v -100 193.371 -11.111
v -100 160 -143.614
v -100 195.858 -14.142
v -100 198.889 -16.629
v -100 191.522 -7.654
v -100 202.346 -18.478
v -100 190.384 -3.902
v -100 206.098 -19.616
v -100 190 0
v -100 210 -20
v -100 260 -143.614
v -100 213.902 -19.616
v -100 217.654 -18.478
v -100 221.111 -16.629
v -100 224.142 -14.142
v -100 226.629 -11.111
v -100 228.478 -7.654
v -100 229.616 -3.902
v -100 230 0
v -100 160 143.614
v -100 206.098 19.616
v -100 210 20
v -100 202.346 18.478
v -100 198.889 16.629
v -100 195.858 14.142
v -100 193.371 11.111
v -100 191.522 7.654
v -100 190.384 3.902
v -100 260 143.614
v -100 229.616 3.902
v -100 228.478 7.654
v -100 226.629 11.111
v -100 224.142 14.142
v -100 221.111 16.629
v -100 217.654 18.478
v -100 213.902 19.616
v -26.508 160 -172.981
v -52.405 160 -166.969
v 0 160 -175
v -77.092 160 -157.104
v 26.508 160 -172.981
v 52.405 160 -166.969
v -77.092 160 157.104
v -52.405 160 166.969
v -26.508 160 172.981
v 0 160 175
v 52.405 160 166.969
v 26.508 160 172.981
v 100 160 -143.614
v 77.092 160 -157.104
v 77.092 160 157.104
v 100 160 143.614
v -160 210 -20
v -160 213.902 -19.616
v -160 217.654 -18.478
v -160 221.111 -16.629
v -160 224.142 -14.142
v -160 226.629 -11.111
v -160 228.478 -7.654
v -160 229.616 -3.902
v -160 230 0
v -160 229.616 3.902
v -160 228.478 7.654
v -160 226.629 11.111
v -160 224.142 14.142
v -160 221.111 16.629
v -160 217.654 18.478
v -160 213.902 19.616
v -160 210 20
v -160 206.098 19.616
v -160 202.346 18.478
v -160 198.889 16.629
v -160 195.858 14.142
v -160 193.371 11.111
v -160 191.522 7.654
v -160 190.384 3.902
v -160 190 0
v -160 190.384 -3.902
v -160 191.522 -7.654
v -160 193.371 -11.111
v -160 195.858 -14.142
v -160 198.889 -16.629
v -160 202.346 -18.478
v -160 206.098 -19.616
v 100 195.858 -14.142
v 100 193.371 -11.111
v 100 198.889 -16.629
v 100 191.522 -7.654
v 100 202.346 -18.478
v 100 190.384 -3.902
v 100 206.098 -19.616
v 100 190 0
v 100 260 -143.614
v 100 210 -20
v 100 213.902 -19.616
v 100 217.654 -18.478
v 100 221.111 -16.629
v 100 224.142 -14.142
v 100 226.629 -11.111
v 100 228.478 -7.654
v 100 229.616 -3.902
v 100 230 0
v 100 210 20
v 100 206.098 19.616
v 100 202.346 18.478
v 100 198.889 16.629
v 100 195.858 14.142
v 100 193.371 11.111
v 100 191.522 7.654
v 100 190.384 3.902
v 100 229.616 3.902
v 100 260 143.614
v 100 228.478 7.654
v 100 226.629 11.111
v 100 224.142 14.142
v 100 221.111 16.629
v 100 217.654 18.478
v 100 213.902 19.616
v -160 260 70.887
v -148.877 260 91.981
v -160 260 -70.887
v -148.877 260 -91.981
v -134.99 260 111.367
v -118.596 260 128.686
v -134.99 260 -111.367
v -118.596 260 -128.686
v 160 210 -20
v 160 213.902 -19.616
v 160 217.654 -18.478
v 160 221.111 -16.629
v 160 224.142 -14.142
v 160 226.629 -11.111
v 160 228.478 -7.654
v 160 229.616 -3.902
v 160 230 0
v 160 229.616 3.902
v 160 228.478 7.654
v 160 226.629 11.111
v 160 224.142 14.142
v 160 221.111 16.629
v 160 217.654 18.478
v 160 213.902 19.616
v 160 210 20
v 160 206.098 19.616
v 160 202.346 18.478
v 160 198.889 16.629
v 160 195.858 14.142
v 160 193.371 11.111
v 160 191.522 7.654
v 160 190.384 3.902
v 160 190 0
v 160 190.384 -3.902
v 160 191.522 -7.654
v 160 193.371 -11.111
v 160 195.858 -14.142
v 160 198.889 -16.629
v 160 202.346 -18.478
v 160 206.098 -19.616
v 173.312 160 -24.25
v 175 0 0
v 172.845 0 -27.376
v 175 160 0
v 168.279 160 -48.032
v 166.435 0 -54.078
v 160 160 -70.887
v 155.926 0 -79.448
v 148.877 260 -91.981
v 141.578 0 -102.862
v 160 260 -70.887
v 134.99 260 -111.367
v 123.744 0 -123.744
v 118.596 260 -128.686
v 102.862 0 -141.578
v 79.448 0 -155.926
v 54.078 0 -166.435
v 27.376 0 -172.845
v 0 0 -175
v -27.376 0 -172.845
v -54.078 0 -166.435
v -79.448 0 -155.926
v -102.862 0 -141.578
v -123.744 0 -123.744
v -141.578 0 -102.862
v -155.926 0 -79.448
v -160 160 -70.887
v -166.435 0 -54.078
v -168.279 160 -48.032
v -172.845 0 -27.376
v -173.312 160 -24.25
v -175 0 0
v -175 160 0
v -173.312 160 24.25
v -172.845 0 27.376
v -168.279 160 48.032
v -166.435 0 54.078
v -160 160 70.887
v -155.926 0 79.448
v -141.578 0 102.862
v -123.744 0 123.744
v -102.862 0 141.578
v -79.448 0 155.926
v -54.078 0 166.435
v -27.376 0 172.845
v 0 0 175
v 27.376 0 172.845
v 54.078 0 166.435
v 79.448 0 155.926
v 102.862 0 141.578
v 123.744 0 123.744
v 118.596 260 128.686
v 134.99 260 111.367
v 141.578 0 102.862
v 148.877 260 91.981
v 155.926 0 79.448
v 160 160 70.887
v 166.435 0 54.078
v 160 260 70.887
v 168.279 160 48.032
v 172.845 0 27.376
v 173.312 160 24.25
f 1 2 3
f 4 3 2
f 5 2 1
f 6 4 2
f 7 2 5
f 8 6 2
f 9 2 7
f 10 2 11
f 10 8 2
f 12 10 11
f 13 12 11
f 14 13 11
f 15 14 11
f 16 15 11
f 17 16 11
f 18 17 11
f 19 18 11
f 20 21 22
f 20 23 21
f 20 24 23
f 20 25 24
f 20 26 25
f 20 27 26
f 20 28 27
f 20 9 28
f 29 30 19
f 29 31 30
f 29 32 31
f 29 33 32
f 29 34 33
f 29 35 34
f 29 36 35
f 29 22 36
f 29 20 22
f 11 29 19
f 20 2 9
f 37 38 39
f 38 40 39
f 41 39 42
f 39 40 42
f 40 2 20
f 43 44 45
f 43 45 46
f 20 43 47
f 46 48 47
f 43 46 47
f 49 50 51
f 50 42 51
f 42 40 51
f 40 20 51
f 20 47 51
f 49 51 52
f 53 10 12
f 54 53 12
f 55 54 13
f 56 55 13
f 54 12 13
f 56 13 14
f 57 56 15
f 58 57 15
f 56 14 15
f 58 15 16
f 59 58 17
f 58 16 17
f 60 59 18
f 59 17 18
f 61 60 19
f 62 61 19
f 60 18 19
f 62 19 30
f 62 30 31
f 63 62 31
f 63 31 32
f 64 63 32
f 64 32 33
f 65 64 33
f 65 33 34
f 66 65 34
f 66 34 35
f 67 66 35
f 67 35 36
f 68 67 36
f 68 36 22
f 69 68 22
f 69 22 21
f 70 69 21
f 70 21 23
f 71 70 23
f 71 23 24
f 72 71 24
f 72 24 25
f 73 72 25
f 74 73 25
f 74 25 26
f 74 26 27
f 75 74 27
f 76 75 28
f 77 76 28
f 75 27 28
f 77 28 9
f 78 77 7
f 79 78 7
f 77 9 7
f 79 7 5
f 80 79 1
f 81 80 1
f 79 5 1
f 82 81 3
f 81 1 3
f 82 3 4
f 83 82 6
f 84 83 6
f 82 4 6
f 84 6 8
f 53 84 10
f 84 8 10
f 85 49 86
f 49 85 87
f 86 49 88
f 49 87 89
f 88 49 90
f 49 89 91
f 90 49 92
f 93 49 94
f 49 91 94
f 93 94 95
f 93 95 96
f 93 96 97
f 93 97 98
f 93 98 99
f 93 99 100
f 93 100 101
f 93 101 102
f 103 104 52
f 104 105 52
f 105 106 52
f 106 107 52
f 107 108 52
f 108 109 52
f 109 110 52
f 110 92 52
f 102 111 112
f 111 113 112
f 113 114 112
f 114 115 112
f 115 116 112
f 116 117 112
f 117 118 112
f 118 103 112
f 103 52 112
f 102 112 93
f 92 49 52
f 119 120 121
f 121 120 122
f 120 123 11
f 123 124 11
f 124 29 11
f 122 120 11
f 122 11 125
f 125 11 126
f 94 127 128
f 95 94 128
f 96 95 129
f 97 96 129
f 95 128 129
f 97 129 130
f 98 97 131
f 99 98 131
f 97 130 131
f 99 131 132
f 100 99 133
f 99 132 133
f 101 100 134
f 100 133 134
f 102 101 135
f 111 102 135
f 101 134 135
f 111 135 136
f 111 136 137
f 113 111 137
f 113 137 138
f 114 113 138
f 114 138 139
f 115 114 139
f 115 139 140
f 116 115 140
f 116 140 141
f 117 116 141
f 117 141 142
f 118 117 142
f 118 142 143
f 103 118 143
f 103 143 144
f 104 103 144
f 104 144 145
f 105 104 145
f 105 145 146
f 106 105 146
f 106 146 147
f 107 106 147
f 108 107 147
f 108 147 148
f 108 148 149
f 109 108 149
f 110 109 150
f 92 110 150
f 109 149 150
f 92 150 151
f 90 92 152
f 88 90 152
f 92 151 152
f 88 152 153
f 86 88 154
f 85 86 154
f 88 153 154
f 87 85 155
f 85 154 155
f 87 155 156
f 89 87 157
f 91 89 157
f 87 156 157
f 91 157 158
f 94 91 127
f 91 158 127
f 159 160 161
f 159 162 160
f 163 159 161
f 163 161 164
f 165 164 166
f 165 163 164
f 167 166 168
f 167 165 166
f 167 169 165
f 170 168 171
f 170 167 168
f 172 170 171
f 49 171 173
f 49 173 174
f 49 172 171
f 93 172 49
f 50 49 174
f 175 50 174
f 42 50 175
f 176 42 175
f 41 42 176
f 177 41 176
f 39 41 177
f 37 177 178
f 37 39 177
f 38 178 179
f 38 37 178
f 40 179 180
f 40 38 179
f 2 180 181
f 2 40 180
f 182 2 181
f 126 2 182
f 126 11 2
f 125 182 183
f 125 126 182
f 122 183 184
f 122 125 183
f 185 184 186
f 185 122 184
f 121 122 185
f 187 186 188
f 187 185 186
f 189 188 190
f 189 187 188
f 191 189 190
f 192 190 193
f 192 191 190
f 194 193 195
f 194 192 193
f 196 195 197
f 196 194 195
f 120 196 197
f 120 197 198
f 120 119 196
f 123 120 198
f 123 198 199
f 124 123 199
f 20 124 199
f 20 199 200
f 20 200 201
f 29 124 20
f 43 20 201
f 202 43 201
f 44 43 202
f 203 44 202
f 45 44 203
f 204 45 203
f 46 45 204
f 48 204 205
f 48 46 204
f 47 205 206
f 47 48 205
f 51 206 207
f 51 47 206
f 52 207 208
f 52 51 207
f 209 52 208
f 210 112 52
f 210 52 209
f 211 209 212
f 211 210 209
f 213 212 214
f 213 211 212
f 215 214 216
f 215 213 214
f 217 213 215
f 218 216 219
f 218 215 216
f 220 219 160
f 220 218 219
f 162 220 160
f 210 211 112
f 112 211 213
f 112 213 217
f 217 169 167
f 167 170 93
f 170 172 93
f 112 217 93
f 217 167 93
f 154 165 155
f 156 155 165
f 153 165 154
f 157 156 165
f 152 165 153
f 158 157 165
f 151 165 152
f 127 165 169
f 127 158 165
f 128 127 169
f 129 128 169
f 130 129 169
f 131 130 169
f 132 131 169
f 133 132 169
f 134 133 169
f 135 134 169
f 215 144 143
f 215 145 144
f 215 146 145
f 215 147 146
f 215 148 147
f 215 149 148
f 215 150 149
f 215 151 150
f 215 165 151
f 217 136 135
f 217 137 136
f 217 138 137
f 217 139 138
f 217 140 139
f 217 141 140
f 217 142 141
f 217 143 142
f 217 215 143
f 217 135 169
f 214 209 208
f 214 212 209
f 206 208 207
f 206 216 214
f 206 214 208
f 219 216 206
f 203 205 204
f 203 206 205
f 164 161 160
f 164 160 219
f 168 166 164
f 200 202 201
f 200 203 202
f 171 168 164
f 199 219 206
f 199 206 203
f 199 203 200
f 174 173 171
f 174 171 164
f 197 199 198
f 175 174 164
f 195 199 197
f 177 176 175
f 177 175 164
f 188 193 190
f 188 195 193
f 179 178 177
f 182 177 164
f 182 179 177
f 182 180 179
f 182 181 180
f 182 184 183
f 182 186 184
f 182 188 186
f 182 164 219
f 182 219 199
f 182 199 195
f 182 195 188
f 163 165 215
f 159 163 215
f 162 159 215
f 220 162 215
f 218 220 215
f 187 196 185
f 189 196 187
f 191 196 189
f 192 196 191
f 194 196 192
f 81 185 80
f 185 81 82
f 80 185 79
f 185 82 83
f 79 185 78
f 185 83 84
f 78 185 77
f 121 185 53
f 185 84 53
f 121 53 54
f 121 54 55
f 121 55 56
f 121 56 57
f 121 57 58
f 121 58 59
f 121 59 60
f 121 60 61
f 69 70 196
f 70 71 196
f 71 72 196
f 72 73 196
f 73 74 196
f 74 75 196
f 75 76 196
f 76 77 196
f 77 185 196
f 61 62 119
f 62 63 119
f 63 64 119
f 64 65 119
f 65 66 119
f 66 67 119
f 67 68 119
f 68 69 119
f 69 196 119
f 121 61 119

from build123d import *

# Parameters (mm, degrees)
ESBO_O1_W                  = 175
ESBO_O1_H                  = 260
ESBO_O2_W                  = 200
ESBO_O2_H                  = 100
ESBO_O2_W_2                = 15
CORTE_EXTRUS_O1_DEPTH      = 176
CORTE_EXTRUS_O1_DEPTH_BACK = 176
ESBO_O3_R                  = 20
CORTE_EXTRUS_O2_DEPTH      = 16
CORTE_EXTRUS_O2_DEPTH_BACK = 336


with BuildPart() as part:
    # Esboço1 → Revolução1 (revolve)
    with BuildSketch(Plane.XY):
        with Locations((87.5, 130)):
            Rectangle(ESBO_O1_W, ESBO_O1_H)
    revolve(axis=Axis((0, 0, 0), (0, 1, 0)))

    # Esboço2 → Corte-extrusão1 (cut, two sides)
    with BuildSketch(Plane.XY) as corte_extrus_o1_sk:
        with Locations((0, 210)):
            Rectangle(ESBO_O2_W, ESBO_O2_H)
        with Locations((167.5, 210)):
            Rectangle(ESBO_O2_W_2, ESBO_O2_H)
        with Locations((-167.5, 210)):
            Rectangle(ESBO_O2_W_2, ESBO_O2_H)
    extrude(amount=CORTE_EXTRUS_O1_DEPTH, mode=Mode.SUBTRACT)
    extrude(corte_extrus_o1_sk.sketch, amount=-CORTE_EXTRUS_O1_DEPTH_BACK, mode=Mode.SUBTRACT)

    # Esboço3 → Corte-extrusão2 (cut, two sides)
    with BuildSketch(Plane(origin=(160, 0, 0), x_dir=(0, 0, -1), z_dir=(1, 0, 0))) as corte_extrus_o2_sk:
        with Locations((0, 210)):
            Circle(ESBO_O3_R)
    extrude(amount=CORTE_EXTRUS_O2_DEPTH, mode=Mode.SUBTRACT)
    extrude(corte_extrus_o2_sk.sketch, amount=-CORTE_EXTRUS_O2_DEPTH_BACK, mode=Mode.SUBTRACT)


solid = part.part
